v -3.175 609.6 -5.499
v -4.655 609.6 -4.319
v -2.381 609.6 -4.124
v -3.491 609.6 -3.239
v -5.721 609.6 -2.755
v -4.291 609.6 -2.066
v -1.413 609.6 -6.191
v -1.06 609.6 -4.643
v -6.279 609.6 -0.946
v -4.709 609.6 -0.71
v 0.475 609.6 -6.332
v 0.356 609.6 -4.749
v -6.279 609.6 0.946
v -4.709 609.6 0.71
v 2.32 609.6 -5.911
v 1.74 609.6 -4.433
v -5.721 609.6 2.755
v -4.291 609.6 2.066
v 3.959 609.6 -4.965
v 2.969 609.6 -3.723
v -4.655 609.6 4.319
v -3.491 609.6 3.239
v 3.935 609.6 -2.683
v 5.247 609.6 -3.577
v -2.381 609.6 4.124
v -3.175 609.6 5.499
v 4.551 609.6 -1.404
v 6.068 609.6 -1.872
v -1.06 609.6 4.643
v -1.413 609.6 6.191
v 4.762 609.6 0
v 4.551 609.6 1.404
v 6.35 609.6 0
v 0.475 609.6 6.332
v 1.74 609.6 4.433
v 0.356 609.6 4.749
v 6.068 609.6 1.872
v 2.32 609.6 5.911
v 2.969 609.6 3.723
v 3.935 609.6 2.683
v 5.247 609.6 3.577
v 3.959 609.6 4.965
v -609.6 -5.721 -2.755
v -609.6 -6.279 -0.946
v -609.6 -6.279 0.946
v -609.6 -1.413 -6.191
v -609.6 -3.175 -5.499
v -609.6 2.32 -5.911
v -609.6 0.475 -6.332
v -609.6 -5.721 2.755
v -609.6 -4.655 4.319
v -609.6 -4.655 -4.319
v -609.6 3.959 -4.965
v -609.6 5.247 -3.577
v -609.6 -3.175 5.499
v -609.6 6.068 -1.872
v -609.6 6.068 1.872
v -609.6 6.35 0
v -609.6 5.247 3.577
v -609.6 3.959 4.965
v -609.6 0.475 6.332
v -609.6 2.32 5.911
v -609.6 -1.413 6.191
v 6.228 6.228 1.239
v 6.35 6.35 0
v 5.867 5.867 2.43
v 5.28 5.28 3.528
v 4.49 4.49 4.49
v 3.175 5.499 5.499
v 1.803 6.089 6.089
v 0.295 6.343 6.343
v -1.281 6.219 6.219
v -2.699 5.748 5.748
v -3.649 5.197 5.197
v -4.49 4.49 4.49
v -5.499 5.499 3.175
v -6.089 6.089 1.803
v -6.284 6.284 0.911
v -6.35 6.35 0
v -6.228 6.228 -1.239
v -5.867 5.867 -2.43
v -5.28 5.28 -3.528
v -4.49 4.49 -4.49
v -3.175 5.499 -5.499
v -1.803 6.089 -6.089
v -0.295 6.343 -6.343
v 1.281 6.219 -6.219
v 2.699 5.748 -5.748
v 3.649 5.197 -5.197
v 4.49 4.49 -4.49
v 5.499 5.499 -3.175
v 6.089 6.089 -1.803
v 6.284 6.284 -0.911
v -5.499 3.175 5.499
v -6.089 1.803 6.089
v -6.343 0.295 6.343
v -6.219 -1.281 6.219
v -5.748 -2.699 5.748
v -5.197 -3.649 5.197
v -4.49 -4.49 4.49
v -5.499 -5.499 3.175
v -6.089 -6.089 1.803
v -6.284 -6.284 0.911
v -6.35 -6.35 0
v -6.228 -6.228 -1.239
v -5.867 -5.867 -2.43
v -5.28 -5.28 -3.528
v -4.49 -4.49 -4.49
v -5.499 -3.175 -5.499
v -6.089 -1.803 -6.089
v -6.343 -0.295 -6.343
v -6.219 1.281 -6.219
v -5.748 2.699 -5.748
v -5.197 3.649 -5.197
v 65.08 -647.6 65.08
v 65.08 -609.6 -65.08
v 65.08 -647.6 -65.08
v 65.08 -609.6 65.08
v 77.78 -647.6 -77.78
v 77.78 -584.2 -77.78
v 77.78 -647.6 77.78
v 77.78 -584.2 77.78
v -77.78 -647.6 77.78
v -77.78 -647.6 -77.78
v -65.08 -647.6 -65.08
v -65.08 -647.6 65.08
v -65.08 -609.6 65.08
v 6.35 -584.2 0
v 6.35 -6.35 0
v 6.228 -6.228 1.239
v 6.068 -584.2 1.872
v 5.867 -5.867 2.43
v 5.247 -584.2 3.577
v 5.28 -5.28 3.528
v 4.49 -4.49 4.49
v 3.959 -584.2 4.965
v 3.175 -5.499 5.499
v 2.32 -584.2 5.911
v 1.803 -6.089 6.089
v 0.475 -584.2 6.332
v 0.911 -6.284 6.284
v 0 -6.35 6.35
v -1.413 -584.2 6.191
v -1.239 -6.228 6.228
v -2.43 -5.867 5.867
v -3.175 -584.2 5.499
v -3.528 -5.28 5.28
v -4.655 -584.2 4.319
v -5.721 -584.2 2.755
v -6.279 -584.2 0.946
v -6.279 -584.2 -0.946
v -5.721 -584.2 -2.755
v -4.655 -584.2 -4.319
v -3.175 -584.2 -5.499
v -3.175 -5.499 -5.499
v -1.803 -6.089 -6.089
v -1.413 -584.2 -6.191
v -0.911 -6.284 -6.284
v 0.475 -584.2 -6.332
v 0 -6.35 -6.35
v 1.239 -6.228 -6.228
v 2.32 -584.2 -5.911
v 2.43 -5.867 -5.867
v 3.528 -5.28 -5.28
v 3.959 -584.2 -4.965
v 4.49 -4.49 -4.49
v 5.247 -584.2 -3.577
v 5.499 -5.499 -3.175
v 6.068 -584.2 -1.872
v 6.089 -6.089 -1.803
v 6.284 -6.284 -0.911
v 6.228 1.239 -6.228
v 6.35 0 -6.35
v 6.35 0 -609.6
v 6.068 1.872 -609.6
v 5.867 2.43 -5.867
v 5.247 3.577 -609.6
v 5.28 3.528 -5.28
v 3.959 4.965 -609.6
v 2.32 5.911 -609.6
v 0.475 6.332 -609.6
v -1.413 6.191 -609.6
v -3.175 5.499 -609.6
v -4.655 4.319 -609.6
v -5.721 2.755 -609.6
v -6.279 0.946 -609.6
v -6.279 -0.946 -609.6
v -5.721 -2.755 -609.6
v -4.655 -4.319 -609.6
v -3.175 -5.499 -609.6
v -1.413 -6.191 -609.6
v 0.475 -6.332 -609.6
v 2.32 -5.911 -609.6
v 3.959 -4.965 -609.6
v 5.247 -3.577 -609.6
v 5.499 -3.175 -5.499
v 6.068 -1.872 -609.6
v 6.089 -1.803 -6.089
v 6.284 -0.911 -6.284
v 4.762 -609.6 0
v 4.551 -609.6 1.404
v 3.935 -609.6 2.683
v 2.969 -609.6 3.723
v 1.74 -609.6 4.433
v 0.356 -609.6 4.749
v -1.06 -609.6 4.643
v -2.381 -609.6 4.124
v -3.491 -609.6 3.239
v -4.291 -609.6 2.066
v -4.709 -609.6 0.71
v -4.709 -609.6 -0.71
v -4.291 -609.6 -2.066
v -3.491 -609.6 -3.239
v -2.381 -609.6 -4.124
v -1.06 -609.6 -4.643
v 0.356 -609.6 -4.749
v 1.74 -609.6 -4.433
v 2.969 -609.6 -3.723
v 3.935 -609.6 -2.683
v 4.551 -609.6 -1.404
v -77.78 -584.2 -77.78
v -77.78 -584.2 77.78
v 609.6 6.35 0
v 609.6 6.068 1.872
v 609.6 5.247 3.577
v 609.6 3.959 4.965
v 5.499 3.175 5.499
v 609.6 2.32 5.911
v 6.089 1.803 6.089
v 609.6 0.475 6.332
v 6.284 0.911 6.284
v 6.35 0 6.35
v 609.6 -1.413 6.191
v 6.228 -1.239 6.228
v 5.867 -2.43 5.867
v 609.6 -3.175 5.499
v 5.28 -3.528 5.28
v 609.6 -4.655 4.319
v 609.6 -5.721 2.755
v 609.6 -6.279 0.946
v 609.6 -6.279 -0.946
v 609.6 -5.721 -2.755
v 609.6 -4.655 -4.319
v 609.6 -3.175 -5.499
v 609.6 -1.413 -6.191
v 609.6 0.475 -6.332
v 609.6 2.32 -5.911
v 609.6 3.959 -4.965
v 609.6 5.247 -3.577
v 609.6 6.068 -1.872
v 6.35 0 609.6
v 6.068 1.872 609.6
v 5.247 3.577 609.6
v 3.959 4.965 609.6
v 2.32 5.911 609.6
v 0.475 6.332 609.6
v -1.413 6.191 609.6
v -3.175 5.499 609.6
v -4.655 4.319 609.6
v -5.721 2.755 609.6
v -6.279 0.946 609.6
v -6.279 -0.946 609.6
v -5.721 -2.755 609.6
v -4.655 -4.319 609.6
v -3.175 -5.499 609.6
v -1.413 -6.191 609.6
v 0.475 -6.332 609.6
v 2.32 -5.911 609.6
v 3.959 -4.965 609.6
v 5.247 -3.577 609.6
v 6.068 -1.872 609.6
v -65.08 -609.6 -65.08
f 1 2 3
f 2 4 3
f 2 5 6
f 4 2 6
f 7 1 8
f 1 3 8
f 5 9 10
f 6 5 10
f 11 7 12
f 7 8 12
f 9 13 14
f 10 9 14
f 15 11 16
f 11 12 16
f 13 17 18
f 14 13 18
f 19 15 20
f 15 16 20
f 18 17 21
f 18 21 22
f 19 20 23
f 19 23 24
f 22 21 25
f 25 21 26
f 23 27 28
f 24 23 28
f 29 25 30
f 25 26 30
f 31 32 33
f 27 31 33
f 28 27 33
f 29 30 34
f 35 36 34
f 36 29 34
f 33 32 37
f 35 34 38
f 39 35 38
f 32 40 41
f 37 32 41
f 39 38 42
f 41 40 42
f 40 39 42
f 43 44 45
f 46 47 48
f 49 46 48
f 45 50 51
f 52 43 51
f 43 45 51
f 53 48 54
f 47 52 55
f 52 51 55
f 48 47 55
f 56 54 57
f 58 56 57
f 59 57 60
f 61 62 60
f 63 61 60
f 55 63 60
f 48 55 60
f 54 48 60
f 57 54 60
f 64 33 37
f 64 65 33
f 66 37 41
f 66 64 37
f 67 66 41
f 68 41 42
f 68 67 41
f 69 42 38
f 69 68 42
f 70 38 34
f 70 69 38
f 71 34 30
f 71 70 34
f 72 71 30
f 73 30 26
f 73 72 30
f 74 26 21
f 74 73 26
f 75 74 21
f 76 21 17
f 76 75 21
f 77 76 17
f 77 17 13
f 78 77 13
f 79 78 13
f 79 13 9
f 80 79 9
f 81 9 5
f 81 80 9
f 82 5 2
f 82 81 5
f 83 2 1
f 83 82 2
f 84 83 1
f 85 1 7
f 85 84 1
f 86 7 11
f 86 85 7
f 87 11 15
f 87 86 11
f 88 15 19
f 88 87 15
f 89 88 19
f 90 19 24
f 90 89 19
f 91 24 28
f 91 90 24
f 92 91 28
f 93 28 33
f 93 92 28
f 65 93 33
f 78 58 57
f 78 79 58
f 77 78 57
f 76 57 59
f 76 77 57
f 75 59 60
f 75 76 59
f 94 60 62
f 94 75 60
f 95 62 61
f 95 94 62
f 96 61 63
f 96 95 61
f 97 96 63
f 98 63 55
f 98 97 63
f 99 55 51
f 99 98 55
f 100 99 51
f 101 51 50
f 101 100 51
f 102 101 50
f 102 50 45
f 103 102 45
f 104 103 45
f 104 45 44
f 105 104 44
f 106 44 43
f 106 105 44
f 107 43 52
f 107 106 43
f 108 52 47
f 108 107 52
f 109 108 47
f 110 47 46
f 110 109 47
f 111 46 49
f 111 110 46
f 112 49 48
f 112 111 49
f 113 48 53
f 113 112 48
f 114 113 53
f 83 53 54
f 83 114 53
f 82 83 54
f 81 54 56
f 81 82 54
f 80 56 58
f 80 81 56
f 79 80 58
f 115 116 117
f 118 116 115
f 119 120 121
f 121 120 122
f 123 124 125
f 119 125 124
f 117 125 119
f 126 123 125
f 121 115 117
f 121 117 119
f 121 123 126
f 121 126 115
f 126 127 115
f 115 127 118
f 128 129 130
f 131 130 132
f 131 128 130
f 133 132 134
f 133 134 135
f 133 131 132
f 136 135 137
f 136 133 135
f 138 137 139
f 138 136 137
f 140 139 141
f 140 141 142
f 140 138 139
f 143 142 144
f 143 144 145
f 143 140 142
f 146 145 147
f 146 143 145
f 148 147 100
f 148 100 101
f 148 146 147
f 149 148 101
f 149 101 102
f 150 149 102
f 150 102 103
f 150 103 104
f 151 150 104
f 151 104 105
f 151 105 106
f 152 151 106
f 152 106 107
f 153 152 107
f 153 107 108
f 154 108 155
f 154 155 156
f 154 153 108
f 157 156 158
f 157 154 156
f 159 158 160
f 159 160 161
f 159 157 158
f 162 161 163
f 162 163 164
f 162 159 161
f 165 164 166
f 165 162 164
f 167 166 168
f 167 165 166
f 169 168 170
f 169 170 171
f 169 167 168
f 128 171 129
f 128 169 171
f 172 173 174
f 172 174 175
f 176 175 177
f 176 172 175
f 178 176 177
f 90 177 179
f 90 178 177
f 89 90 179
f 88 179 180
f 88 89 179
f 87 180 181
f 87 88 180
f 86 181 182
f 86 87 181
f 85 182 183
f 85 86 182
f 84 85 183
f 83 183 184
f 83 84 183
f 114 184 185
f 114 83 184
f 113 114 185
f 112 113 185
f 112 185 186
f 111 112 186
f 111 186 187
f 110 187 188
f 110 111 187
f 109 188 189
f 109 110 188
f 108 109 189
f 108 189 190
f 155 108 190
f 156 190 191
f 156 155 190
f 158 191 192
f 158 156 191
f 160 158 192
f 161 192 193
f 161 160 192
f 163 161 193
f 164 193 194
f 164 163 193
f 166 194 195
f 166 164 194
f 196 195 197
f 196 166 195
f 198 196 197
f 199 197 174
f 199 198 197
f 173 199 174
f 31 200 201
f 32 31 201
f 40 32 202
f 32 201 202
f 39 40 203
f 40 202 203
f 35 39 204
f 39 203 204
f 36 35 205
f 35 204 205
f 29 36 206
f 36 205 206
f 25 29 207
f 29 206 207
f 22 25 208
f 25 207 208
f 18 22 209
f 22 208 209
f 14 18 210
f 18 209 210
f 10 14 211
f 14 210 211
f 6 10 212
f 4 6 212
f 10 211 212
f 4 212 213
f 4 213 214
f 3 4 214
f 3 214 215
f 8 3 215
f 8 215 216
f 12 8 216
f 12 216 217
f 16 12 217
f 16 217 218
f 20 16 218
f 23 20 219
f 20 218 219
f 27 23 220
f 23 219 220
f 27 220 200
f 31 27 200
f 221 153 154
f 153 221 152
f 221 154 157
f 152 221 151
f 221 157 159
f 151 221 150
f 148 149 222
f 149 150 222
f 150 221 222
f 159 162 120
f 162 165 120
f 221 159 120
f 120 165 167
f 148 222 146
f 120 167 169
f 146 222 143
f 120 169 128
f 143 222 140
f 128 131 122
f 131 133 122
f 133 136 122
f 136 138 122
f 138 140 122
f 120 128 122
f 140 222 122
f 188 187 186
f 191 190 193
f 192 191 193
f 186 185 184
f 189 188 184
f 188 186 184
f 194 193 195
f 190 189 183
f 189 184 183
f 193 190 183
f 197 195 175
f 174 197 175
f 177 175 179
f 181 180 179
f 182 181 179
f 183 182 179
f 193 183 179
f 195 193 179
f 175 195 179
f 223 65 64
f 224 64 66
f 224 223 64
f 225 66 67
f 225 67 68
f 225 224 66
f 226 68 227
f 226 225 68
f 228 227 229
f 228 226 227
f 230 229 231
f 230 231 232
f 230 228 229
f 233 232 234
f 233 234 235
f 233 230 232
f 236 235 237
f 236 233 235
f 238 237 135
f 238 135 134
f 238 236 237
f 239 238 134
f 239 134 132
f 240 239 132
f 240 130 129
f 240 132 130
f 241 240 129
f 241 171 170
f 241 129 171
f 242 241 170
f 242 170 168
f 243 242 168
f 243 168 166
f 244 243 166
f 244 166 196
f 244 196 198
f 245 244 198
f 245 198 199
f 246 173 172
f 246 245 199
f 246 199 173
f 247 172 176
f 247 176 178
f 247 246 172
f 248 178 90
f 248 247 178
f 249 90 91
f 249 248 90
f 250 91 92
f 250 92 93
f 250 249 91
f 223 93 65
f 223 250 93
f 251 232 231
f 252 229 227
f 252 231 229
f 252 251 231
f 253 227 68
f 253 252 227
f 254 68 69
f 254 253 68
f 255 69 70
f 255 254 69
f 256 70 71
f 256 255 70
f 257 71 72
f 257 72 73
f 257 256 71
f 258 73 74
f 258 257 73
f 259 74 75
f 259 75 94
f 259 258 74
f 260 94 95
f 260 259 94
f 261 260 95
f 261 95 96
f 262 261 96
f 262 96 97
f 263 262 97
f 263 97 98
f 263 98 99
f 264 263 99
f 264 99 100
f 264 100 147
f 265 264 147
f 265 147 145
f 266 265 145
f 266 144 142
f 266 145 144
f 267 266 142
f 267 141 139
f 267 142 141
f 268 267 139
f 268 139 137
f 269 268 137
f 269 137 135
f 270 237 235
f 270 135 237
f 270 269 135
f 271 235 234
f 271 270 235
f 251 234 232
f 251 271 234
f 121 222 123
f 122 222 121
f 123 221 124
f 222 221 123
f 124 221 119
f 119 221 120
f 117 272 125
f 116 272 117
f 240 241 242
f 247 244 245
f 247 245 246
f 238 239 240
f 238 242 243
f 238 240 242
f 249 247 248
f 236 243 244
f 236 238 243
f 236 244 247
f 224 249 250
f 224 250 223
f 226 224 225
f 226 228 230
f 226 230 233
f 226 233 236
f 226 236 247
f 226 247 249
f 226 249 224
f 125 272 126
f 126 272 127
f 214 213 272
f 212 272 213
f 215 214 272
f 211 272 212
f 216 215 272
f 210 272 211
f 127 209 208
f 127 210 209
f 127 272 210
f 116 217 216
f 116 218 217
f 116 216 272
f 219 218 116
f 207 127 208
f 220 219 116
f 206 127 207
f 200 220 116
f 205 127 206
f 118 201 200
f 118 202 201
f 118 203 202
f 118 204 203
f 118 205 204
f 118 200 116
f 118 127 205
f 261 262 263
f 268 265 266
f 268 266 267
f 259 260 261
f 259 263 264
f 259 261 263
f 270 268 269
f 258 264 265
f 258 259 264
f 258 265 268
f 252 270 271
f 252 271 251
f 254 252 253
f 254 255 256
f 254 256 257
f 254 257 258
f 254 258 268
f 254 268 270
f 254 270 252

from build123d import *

# Parameters (mm, degrees)
F2_R      = 6.35
F4_DEPTH  = 609.6
F3_R      = 6.35
F5_DEPTH  = 609.6
F1_R      = 6.35
F6_DEPTH  = 609.6
F7_W      = 155.56
F7_H      = 155.56
F8_DEPTH  = 25.4
F9_W      = 155.56
F9_H      = 155.56
F9_W_2    = 130.16
F9_H_2    = 130.16
F11_DEPTH = 38
F12_R     = 4.7625
F13_DEPTH = 1219.2


with BuildPart() as f4:
    # F2 (on Front) → F4 (new body, symmetric)
    with BuildSketch(Plane.XZ):
        Circle(F2_R)
    extrude(amount=F4_DEPTH, both=True)

    # F3 (on Right) → F5 (join, symmetric)
    with BuildSketch(Plane.YZ):
        Circle(F3_R)
    extrude(amount=F5_DEPTH, both=True)

    # F1 (on Top) → F6 (join, symmetric)
    with BuildSketch(Plane.XY):
        Circle(F1_R)
    extrude(amount=F6_DEPTH, both=True)

    # F7 (on face) → F8 (join)
    with BuildSketch(Plane.XZ.offset(609.6)):
        Rectangle(F7_W, F7_H)
    extrude(amount=-F8_DEPTH)

    # F9 (on face) → F11 (join)
    with BuildSketch(Plane.XZ.offset(609.6)):
        Rectangle(F9_W, F9_H)
        Rectangle(F9_W_2, F9_H_2, mode=Mode.SUBTRACT)
    extrude(amount=F11_DEPTH)

    # F12 (on face) → F13 (cut)
    with BuildSketch(Plane.XZ.offset(609.6)):
        Circle(F12_R)
    extrude(amount=-F13_DEPTH, mode=Mode.SUBTRACT)


solid = f4.part
